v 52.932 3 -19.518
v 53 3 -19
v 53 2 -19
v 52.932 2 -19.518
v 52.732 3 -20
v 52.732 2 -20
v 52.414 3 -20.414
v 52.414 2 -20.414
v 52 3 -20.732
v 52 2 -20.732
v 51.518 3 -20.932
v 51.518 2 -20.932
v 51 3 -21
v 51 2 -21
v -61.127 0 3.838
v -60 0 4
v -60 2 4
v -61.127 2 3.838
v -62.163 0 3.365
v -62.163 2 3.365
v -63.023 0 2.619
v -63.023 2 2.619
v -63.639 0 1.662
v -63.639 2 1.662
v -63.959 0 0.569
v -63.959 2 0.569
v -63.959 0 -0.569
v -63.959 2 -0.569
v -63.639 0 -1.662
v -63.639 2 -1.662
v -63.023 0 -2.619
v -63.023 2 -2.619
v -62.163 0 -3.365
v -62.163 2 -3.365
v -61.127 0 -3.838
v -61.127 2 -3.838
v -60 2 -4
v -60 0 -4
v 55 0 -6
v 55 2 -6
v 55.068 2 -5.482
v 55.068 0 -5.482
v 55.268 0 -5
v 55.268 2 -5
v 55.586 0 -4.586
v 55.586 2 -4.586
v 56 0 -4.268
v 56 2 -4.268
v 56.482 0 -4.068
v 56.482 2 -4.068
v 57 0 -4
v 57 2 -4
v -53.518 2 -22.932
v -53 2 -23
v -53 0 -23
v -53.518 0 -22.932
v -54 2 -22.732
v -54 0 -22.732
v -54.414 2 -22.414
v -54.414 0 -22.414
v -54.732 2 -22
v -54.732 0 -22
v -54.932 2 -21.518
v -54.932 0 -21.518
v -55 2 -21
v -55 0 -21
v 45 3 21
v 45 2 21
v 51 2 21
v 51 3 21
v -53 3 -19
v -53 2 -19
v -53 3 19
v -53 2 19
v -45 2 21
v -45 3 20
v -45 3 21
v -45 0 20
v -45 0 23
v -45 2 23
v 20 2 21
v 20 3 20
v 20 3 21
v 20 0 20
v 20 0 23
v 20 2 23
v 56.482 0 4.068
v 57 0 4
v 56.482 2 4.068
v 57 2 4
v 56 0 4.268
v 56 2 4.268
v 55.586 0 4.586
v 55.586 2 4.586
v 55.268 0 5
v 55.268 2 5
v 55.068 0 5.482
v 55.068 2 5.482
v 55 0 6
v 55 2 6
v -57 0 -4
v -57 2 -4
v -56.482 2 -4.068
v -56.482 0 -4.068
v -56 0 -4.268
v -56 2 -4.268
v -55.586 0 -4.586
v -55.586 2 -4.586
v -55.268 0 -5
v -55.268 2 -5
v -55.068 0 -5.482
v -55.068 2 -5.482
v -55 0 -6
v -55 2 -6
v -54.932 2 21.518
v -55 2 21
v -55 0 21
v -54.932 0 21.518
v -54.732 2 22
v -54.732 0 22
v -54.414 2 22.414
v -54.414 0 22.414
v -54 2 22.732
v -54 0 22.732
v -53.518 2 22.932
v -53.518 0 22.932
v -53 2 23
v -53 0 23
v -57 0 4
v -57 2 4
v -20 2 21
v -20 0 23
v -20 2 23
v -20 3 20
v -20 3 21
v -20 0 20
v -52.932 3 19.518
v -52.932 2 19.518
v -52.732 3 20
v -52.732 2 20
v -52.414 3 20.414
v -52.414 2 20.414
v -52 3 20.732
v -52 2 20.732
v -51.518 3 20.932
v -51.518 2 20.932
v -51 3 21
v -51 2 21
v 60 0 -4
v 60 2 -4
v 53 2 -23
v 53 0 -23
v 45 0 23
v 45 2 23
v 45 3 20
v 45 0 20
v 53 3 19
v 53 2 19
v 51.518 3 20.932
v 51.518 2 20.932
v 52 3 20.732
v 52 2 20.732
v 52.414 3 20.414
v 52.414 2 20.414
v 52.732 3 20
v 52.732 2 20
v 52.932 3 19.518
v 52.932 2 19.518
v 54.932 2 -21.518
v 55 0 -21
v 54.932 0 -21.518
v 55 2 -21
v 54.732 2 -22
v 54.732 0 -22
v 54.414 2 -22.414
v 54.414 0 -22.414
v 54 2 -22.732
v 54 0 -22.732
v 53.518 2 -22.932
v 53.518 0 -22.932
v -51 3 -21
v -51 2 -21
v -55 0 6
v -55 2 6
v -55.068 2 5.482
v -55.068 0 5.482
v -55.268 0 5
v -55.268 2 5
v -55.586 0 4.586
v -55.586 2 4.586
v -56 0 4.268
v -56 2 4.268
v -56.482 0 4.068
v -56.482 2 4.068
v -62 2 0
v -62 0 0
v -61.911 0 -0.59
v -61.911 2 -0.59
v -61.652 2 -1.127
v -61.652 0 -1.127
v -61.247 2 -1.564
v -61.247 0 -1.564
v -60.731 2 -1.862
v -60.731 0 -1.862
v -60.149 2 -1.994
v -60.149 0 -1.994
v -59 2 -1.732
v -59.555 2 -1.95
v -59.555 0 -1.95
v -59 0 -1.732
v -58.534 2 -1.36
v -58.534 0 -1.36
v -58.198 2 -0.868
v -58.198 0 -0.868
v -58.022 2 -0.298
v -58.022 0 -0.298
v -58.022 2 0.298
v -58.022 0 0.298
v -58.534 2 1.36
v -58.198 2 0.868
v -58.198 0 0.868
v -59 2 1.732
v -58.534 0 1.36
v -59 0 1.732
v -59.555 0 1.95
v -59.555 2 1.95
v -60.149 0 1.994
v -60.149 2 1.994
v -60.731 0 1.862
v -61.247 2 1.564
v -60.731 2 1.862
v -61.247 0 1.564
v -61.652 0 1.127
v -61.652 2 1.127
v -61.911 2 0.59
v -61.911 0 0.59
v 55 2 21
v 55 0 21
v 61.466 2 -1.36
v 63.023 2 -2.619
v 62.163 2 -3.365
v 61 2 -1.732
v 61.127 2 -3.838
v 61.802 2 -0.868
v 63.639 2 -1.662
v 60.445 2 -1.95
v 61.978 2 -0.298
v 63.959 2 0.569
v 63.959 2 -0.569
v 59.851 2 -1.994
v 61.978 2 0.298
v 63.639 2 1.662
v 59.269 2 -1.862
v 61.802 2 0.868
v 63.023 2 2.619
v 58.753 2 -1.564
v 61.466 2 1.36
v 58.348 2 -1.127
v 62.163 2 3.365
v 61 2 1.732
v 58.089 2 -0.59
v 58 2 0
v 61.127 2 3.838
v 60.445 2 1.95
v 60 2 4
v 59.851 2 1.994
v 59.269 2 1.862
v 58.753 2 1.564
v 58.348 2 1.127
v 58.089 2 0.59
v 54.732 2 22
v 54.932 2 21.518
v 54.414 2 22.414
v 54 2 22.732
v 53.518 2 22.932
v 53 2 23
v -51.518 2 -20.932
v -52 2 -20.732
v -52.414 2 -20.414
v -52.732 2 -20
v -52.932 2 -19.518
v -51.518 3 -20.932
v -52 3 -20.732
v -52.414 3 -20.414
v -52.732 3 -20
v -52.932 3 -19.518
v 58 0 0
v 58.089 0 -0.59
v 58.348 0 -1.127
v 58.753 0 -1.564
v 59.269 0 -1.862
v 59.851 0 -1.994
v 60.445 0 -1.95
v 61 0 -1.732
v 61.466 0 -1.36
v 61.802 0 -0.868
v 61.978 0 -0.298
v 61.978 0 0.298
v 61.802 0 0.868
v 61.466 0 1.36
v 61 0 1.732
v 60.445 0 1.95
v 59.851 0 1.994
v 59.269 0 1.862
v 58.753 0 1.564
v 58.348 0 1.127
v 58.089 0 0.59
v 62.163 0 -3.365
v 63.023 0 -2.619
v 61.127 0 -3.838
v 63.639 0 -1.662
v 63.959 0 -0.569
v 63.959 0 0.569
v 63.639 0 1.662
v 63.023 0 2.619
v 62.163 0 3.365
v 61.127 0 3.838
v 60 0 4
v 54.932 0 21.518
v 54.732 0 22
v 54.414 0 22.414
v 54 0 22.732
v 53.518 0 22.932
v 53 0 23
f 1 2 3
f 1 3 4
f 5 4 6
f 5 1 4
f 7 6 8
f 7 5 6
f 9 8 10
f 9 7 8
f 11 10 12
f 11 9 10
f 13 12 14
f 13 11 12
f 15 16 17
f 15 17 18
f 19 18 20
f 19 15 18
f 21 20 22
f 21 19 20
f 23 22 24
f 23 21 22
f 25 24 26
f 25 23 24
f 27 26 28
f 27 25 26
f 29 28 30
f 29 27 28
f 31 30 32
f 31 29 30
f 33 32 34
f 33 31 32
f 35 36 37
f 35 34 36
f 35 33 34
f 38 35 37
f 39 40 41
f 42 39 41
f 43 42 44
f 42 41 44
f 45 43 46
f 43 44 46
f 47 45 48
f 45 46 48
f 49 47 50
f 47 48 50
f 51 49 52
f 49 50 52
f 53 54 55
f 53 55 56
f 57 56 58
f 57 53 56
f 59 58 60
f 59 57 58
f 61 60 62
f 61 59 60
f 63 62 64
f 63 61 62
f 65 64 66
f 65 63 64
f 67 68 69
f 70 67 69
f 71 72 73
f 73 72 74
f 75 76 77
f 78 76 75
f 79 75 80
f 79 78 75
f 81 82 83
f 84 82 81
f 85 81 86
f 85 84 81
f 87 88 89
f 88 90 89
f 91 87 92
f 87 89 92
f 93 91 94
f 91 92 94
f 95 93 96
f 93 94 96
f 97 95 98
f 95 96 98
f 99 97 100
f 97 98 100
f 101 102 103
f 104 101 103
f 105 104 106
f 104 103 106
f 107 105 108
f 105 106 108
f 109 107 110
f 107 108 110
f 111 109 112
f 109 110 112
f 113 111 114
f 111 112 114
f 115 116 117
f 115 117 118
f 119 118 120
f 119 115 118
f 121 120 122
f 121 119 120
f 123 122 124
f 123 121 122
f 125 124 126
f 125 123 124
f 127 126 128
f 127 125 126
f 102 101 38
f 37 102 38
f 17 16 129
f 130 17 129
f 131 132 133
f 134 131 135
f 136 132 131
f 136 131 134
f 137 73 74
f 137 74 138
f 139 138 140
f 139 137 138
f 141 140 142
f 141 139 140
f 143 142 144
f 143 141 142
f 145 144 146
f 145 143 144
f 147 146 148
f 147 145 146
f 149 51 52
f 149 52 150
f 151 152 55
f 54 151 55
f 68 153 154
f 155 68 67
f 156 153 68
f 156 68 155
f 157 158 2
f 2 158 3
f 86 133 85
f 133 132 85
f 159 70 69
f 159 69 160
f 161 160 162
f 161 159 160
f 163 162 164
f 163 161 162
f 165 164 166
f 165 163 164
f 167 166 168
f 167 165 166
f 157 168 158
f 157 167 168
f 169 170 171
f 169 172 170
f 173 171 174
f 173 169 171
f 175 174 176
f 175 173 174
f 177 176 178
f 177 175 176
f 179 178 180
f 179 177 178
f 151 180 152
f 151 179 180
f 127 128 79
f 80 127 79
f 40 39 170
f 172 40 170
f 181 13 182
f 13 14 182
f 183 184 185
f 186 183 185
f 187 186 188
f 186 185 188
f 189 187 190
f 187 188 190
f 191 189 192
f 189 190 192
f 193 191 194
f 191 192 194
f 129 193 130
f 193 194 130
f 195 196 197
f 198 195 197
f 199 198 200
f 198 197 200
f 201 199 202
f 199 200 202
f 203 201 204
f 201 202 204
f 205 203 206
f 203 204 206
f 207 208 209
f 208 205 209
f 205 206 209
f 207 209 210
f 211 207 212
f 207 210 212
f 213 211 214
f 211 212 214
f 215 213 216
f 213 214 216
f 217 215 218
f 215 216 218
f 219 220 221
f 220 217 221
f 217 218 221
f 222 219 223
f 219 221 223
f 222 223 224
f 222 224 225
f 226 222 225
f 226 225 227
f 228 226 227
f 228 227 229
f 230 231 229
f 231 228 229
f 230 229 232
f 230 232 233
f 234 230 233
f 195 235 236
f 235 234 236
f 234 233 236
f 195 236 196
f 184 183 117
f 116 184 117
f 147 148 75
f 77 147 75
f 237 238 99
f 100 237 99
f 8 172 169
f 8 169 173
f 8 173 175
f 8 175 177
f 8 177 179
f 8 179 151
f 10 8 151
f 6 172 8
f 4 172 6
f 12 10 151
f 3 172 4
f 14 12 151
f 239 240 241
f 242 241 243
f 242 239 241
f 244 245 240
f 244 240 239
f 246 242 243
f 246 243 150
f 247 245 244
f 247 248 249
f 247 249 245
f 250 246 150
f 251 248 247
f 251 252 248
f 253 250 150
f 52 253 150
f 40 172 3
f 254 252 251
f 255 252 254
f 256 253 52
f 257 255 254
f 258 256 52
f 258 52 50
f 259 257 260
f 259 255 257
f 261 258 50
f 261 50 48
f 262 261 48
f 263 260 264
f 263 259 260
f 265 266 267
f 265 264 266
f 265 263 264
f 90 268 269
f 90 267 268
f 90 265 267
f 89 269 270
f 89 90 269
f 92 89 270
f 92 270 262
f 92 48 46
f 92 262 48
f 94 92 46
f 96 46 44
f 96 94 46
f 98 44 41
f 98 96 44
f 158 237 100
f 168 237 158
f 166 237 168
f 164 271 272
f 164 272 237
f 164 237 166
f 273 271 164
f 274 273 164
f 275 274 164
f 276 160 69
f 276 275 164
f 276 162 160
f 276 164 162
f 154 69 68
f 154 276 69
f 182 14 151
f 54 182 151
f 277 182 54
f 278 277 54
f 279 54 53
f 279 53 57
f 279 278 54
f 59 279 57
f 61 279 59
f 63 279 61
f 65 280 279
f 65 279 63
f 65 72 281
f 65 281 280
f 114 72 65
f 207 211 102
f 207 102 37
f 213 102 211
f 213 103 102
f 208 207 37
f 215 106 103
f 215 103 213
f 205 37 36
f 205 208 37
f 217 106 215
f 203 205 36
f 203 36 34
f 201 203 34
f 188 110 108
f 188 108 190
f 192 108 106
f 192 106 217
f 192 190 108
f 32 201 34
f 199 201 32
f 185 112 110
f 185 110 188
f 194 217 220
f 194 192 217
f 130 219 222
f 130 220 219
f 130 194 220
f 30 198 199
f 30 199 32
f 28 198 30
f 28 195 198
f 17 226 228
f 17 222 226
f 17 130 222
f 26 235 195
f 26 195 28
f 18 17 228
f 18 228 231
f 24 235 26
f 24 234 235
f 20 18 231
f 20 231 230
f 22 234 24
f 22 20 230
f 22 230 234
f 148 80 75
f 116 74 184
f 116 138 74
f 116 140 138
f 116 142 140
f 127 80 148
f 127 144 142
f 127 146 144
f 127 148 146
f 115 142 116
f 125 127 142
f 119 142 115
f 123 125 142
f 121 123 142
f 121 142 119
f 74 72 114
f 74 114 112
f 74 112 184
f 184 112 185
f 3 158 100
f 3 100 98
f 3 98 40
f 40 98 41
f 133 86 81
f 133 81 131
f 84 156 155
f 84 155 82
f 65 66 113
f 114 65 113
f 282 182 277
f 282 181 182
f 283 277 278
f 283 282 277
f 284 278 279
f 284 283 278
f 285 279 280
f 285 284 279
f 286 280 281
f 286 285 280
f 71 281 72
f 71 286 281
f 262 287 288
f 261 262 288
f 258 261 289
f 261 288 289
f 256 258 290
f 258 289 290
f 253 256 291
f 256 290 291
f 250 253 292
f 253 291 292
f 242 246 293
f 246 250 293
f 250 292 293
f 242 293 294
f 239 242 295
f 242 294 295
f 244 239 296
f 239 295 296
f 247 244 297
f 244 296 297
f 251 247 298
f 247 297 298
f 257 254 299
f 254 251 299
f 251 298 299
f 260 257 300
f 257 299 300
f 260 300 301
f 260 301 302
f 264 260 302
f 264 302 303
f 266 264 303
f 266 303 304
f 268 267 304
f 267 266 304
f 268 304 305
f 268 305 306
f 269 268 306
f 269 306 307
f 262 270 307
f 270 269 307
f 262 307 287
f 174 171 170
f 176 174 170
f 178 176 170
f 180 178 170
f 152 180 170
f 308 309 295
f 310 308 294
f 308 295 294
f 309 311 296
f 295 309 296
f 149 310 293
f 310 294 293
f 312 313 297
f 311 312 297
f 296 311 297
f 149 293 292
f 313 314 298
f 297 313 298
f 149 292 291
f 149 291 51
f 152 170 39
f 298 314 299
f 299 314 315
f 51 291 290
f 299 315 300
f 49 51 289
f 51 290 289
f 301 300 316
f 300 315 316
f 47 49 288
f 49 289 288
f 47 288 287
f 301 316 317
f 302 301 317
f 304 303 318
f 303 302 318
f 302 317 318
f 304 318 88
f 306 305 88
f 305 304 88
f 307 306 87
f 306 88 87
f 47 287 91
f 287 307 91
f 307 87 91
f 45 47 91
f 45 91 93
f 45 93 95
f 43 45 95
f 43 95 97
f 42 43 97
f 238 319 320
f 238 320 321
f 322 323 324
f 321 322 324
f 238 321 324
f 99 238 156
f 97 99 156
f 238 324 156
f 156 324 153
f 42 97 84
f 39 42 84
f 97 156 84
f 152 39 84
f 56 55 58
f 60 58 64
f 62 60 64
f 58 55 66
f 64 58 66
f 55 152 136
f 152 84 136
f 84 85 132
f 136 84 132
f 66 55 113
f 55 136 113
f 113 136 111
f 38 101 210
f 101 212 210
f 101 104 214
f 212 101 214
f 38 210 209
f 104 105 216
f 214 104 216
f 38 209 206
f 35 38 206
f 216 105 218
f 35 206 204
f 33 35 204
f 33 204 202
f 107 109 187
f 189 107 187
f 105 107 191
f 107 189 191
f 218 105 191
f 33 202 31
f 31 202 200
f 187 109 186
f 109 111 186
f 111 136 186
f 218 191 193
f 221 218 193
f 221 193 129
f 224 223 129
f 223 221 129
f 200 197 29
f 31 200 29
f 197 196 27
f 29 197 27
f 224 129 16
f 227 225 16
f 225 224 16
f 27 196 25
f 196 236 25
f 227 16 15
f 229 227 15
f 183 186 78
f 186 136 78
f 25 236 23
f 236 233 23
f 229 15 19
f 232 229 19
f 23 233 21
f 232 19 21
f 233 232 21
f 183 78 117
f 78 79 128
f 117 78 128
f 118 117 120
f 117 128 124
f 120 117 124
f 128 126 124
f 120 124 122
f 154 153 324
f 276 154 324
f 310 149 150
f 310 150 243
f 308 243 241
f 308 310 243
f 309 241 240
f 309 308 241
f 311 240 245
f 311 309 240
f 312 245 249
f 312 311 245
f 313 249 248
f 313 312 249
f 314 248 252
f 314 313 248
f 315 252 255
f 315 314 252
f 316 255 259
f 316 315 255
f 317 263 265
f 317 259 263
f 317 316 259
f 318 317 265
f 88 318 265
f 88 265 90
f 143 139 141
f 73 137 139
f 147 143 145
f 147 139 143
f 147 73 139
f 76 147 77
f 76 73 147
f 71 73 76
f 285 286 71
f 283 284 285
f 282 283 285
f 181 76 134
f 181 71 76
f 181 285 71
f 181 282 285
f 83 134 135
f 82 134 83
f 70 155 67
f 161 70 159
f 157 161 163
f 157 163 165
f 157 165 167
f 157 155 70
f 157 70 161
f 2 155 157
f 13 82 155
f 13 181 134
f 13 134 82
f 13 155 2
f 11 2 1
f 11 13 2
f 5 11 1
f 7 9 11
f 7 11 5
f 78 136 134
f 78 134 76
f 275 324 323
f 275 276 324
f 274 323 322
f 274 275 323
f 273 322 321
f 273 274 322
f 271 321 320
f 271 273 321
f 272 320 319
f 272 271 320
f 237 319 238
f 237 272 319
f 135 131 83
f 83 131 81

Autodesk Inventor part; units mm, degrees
ref_plane "YZ Plane" through (0, 0, 0) normal (1, 0, 0) x (0, 1, 0)
sketch "Sketch1" plane through (0, 0, 0) normal (0, 1, 0) x (-1, 0, 0)
  line L0 (55, 23) -> (-55, 23)
  line L1 (-55, 23) -> (-55, -23)
  line L2 (-55, -23) -> (55, -23)
  line L3 (55, -23) -> (55, 23)
  line L4 (55, 23) -> (-55, -23) construction
  line L5 (-55, 23) -> (55, -23) construction
  circle A0 centre (60, 0) radius 2
  circle A1 centre (-60, 0) radius 2
  arc A2 (60, -4) -> (60, 4) centre (60, 0) ccw
  line L6 (55, -4) -> (60, -4)
  line L7 (60, 4) -> (55, 4)
  line L8 (55, 4) -> (55, -4)
  arc A3 (-60, 4) -> (-60, -4) centre (-60, 0) ccw
  line L9 (-55, -4) -> (-60, -4)
  line L10 (-60, 4) -> (-55, 4)
  line L11 (-55, 4) -> (-55, -4)
  point P0 (0, 0)
  point P1 (55, 0)
  point P2 (-55, 0)
  point P3 (55, 0)
  point P4 (-55, 0)
  dimension "d0" = 110
  dimension "d1" = 46
  dimension "d2" = 4
  dimension "d3" = 5
  dimension "d4" = 4
  dimension "d5" = 5
  dimension "d6" = 8
  dimension "d7" = 5
  dimension "d8" = 4
  dimension "d9" = 8
  dimension "d10" = 5
  dimension "d11" = 4
extrude "Extrusion1" add sketch "Sketch1" along normal blind 2
sketch "Sketch2" plane through (0, 2, 0) normal (0, 1, 0) x (1, 0, 0)
  line L0 (-53, -21) -> (53, -21)
  line L1 (53, -21) -> (53, 21)
  line L2 (53, 21) -> (-53, 21)
  line L3 (-53, 21) -> (-53, -21)
  line L4 (-53, -21) -> (53, 21) construction
  line L5 (53, -21) -> (-53, 21) construction
  point P0 (0, 0)
  dimension "d14" = 106
  dimension "d15" = 42
extrude "Extrusion2" add sketch "Sketch2" along normal blind 1
fillet "Fillet1" radius 2 12 edges at (53, 2.5, 21) (55, 1, 23) (55, 1, 4) (55, 1, -4) (55, 1, -23) (53, 2.5, -21) (-55, 1, -23) (-53, 2.5, -21) (-55, 1, -4) (-55, 1, 4) (-53, 2.5, 21) (-55, 1, 23)
sketch "Sketch3" plane through (0, 0, 0) normal (0, -1, 0) x (1, 0, 0)
  line L0 (-53, 23) -> (53, 23) projected
  line L1 (-45, 23) -> (-20, 23)
  line L2 (-20, 23) -> (-20, 20)
  line L3 (-20, 20) -> (-45, 20)
  line L4 (-45, 20) -> (-45, 23)
  line L5 (20, 23) -> (45, 23)
  line L6 (45, 23) -> (45, 20)
  line L7 (45, 20) -> (20, 20)
  line L8 (20, 20) -> (20, 23)
  line L9 (-55, 6) -> (-55, 21) projected
  line L10 (55, 21) -> (55, 6) projected
  point P0 (0, 0)
  point P1 (-45, 21.5)
  point P2 (45, 21.5)
  dimension "d19" = 25
  dimension "d20" = 3
  dimension "d21" = 25
  dimension "d22" = 3
  dimension "d23" = 10
  dimension "d24" = 10
extrude "Extrusion3" cut sketch "Sketch3" against normal through all
ref_plane "Work Plane1" through (64, 2, 0) normal (0, 0, -1) x (-1, 0, 0)
ref_plane "Work Plane2" through (0, 2, -23) normal (-1, 0, 0) x (0, -1, 0)
properties part number "StereoPiBracketLid"
